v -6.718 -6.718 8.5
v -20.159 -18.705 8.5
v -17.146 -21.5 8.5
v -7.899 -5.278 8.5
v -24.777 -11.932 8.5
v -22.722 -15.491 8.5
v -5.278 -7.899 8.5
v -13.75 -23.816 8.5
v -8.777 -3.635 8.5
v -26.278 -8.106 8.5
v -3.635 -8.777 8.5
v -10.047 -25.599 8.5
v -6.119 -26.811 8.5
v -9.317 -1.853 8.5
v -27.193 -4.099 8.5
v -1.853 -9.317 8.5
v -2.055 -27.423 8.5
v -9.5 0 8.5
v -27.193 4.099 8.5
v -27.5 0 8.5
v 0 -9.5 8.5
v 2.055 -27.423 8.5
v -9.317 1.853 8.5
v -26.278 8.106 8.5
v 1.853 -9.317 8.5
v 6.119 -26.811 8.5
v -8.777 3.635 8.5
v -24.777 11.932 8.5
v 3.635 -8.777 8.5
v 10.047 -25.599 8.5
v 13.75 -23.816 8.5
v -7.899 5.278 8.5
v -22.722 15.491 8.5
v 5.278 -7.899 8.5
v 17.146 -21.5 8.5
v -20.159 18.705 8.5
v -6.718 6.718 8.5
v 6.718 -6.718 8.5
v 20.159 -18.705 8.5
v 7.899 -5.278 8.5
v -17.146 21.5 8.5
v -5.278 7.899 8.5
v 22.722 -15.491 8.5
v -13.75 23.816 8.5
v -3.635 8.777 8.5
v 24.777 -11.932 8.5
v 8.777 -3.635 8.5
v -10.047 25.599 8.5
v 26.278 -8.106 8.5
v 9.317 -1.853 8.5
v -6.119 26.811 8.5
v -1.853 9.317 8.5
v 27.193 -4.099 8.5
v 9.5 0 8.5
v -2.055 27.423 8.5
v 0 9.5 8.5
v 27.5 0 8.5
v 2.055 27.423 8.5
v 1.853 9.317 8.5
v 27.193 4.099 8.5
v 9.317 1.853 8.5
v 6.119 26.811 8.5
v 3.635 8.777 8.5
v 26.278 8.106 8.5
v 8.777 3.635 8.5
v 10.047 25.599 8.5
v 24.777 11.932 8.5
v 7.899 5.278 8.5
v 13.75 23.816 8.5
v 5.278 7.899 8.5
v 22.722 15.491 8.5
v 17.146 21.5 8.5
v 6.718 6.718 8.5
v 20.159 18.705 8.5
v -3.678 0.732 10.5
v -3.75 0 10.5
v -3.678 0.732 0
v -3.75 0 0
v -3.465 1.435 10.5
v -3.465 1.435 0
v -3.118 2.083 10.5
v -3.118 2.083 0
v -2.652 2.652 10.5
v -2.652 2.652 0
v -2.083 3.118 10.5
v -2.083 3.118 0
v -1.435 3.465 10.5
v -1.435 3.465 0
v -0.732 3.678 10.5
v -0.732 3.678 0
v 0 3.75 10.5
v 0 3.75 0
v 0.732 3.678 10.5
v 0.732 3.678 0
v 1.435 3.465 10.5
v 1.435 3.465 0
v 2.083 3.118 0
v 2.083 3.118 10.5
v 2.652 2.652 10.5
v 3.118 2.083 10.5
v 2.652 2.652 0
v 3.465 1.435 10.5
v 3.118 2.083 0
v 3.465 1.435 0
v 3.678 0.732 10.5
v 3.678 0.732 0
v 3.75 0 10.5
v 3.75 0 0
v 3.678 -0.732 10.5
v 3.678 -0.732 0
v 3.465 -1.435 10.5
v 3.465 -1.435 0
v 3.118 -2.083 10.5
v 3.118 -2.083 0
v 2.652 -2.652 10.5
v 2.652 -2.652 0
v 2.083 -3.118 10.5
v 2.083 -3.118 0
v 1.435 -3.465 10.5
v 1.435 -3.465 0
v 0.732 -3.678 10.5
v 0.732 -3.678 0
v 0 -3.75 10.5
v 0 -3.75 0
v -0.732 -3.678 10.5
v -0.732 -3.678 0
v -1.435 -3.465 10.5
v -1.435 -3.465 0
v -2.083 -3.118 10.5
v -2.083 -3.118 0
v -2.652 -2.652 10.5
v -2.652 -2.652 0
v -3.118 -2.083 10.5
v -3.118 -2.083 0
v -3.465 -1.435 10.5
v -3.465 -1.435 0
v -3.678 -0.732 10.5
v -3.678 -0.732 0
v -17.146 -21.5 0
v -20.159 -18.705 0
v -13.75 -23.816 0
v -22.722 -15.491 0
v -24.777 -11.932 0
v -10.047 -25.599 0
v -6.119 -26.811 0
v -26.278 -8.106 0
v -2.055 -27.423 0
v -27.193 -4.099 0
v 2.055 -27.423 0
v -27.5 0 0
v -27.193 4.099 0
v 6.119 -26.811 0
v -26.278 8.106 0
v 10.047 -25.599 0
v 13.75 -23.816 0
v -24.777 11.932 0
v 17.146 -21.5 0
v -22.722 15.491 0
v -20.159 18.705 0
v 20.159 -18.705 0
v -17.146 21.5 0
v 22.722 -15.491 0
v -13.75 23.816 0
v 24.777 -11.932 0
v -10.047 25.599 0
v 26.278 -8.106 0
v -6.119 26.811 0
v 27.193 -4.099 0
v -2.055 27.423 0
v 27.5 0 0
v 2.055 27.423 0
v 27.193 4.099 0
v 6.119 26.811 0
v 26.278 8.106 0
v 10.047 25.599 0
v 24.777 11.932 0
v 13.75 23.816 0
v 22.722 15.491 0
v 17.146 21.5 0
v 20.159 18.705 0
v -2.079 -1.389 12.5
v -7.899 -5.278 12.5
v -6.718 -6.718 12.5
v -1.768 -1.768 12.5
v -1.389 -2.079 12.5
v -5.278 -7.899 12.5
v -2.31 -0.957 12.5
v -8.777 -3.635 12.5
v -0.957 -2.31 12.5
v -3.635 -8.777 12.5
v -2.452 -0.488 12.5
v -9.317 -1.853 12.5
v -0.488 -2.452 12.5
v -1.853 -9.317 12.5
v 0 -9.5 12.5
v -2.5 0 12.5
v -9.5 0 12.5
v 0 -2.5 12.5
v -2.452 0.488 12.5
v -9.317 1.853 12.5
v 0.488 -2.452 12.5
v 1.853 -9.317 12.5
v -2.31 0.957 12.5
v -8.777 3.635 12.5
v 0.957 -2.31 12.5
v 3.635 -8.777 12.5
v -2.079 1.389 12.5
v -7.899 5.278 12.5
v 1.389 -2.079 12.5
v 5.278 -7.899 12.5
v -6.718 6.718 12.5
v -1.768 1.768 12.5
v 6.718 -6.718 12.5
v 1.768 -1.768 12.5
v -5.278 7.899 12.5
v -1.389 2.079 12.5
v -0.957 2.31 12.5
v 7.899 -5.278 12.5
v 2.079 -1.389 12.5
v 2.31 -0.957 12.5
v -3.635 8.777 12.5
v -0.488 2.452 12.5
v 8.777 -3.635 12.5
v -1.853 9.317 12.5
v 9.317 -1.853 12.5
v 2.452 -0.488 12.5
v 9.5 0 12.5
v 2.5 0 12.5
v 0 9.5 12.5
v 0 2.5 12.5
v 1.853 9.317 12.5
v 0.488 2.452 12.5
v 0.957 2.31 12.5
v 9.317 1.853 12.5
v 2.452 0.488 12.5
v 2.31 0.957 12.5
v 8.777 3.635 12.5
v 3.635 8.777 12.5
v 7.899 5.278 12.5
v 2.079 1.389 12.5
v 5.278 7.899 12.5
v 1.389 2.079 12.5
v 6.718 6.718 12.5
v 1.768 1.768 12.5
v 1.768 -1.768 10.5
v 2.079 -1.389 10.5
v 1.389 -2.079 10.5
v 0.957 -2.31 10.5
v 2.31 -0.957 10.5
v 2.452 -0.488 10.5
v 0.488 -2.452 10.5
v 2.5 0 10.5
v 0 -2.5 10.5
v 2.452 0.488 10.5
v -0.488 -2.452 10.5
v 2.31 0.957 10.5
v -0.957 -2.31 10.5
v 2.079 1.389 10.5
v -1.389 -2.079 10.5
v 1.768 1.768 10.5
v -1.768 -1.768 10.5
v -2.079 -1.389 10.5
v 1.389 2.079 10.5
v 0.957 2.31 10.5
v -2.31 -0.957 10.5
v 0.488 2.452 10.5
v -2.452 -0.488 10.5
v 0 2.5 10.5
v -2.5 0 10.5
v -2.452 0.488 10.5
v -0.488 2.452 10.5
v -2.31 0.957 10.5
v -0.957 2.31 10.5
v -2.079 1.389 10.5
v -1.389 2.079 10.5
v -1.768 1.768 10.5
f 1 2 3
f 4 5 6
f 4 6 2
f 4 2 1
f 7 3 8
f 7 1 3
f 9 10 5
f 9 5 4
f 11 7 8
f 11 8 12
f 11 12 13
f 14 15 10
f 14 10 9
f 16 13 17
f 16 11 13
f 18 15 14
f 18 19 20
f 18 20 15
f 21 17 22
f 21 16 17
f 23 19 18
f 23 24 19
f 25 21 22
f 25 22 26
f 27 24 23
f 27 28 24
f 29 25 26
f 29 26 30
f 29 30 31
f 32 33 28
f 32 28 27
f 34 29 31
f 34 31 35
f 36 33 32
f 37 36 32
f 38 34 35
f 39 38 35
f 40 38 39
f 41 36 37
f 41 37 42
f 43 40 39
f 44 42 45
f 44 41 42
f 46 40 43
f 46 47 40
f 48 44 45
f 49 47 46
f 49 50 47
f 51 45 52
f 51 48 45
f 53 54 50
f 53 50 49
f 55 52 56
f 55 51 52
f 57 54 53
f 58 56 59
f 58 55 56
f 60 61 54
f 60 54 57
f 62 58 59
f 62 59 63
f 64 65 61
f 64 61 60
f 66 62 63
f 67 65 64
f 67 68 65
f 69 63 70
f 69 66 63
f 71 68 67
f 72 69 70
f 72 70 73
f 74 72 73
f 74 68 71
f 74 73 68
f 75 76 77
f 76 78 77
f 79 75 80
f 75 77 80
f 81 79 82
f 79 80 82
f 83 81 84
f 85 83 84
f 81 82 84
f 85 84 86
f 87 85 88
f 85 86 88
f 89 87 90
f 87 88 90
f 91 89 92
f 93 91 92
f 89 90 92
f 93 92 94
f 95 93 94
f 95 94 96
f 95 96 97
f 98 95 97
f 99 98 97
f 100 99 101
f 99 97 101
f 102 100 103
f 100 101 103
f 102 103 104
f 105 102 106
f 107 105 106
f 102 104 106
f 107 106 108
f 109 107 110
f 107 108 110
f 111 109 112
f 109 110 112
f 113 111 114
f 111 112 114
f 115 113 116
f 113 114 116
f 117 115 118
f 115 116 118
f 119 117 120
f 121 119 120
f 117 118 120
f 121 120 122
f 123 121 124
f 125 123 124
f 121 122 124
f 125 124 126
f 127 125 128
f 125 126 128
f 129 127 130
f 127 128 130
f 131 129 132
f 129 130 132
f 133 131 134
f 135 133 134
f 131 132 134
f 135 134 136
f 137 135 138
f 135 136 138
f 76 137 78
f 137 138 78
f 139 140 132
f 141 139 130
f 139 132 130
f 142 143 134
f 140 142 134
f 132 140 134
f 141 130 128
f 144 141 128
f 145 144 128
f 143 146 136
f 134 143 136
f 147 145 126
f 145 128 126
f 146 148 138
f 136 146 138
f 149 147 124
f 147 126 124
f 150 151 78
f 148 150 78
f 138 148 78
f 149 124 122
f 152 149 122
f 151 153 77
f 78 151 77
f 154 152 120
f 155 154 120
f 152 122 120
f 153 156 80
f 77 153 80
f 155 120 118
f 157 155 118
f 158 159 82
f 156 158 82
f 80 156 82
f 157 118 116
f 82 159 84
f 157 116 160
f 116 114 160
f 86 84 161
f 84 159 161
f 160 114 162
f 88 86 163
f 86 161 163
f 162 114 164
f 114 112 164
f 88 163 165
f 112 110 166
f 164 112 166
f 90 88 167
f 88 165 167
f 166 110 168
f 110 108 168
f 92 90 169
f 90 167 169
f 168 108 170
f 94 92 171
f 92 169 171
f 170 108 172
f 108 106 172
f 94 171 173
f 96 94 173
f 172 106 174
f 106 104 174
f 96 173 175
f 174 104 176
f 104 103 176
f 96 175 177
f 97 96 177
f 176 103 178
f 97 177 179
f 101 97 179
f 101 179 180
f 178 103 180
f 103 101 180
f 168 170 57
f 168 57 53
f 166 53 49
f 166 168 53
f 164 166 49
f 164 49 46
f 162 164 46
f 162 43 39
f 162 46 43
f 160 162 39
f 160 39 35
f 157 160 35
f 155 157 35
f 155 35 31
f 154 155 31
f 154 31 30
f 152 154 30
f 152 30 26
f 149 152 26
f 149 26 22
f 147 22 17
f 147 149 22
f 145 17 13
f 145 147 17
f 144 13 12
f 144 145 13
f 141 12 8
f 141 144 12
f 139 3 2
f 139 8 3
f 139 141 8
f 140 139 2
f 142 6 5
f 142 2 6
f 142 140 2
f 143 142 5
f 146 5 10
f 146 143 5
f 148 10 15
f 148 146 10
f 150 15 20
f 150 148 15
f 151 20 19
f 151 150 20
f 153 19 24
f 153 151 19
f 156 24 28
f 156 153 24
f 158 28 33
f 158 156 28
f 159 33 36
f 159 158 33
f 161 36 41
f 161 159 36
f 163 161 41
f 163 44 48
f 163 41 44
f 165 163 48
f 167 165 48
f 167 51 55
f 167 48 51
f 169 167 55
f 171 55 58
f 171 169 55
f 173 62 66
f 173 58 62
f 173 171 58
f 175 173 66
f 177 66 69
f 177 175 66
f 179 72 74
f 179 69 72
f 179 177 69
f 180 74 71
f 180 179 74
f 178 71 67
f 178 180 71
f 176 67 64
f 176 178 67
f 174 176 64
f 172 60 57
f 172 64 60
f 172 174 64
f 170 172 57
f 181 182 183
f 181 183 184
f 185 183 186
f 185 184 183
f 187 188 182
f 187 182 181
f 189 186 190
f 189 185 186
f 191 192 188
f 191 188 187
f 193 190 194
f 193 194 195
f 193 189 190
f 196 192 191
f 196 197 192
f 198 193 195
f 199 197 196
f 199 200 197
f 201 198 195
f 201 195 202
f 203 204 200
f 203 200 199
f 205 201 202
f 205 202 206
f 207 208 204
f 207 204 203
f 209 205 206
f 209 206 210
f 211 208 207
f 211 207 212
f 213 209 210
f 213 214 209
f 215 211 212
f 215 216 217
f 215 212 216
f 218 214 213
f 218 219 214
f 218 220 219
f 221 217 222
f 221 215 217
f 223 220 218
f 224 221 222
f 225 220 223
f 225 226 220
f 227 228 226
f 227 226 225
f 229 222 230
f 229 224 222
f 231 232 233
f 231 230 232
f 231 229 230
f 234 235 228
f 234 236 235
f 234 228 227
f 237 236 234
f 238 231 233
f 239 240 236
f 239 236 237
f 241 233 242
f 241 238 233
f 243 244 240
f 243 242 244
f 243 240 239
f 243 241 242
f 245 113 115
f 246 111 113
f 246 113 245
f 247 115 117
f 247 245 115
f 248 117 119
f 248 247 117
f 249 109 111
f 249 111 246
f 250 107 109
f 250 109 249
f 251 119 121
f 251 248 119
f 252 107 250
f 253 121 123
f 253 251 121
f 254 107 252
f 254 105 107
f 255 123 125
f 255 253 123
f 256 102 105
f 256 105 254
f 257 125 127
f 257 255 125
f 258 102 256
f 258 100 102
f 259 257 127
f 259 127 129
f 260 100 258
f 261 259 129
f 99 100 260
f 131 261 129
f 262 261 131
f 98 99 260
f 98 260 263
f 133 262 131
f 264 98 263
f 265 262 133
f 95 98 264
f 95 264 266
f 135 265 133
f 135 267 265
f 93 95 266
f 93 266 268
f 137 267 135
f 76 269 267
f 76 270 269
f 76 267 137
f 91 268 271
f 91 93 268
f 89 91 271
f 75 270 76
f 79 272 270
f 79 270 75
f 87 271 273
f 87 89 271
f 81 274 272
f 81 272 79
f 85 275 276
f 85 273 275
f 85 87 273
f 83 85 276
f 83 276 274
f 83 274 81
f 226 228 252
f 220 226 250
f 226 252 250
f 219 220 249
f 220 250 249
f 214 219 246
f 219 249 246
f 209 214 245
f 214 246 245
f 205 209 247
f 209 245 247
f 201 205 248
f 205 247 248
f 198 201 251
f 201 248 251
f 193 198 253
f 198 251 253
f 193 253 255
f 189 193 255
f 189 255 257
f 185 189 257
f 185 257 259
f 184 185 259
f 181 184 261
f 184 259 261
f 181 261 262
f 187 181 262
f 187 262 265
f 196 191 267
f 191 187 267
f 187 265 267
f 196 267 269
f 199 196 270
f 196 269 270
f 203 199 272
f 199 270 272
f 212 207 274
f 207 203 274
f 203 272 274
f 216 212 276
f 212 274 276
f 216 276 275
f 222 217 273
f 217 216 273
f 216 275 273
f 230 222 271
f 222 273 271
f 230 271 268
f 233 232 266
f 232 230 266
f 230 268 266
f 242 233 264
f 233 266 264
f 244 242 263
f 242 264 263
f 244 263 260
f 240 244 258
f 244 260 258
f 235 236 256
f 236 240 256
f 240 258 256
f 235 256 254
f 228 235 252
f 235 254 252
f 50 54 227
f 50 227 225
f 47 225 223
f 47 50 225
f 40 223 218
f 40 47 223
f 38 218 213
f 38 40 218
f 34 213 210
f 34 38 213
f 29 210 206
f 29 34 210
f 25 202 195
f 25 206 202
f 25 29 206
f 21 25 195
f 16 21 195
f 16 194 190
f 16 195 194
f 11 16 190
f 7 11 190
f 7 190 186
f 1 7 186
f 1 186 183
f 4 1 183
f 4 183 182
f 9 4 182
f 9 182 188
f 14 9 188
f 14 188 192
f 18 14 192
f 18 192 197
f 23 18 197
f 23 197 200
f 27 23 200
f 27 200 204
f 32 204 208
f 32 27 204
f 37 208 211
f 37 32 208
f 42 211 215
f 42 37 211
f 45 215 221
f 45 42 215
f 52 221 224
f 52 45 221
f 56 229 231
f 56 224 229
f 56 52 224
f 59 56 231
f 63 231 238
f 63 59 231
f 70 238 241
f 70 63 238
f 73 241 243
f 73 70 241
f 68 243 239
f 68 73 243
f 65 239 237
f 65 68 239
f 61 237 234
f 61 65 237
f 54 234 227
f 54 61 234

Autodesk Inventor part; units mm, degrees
ref_plane "YZ Plane" through (0, 0, 0) normal (1, 0, 0) x (0, 1, 0)
ref_plane "XZ Plane" through (0, 0, 0) normal (0, 1, 0) x (-1, 0, 0)
ref_plane "XY Plane" through (0, 0, 0) normal (0, 0, 1) x (1, 0, 0)
sketch "Boceto1" plane through (0, 0, 0) normal (0, 0, 1) x (1, 0, 0)
  circle A0 centre (0, 0) radius 27.5
  circle A1 centre (0, 0) radius 2.5
  dimension "d0" = 55
  dimension "d3" = 5
extrude "Extrusión1" add sketch "Boceto1" along normal blind 8.5
sketch "Boceto2" plane through (0, 0, 8.5) normal (0, 0, 1) x (1, 0, 0)
  circle A0 centre (0, 0) radius 2.5 projected
  circle A1 centre (0, 0) radius 9.5
  dimension "d4" = 19
extrude "Extrusión2" add sketch "Boceto2" along normal blind 4
sketch "Boceto3" plane through (0, 0, 0) normal (0, 0, -1) x (-1, 0, 0)
  circle A0 centre (0, 0) radius 2.5 projected
  circle A1 centre (0, 0) radius 3.75
  dimension "d7" = 7.5
extrude "Extrusión3" cut sketch "Boceto3" against normal blind 10.5 contours A0 | A1
properties part number "omniwheel"
